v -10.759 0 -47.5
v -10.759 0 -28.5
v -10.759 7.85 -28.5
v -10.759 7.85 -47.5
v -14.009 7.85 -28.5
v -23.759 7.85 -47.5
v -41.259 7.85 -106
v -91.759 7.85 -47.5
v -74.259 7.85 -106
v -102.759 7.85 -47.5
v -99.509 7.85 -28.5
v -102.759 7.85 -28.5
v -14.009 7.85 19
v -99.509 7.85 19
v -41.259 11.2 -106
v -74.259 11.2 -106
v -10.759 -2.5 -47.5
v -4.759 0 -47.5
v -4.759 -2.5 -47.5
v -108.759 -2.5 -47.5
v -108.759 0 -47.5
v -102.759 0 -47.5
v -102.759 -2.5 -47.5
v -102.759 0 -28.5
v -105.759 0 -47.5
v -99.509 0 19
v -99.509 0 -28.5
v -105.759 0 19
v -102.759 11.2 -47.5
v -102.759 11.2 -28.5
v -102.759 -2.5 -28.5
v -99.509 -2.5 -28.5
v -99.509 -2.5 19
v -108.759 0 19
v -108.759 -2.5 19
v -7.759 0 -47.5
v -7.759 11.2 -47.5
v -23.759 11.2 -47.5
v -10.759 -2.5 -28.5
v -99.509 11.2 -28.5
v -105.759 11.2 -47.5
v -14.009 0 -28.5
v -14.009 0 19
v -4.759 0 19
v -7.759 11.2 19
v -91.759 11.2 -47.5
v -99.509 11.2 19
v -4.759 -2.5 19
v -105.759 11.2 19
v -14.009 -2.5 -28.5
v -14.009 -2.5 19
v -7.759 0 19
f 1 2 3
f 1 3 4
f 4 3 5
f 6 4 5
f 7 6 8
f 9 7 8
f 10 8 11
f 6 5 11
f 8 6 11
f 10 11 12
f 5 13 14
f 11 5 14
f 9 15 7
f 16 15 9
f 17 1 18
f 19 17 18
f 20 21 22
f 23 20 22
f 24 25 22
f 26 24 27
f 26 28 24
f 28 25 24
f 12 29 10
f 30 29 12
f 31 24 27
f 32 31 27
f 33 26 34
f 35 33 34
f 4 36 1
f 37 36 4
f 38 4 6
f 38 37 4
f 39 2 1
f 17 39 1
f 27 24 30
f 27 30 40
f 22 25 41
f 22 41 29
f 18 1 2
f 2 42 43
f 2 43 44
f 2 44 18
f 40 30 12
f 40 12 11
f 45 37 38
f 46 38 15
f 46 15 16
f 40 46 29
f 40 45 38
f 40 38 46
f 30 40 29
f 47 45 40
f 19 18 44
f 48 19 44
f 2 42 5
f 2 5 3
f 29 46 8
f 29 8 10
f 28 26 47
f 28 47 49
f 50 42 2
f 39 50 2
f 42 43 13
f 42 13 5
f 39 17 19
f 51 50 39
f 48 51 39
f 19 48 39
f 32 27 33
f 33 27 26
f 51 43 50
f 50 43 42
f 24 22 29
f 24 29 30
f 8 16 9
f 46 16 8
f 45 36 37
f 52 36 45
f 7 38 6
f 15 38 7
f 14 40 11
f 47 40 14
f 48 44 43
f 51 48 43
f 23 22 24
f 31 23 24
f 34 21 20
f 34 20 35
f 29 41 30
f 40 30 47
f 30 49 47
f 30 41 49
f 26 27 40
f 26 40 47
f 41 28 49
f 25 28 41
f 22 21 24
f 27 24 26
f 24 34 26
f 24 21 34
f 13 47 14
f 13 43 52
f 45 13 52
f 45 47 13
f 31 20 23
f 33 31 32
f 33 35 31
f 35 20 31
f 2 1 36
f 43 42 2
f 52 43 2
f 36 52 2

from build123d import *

# Parameters (mm, degrees)
F0_W     = 3
F0_H     = 66.5
F1_DEPTH = 2.5
F2_DEPTH = 11.2
F4_DEPTH = 3.35


with BuildPart() as f1:
    # F0 (on Front) → F1 (new body)
    with BuildSketch(Plane.XZ):
        with Locations((-107.2585358843, -14.25)):
            Rectangle(F0_W, F0_H)
        Polygon((-99.5085358843, 19), (-105.7585358843, 19), (-105.7585358843, -47.5), (-102.7585358843, -47.5), (-102.7585358843, -28.5), (-99.5085358843, -28.5), align=None)
    extrude(amount=F1_DEPTH)


with BuildPart() as f1b:
    # F0 (on Front) → F1, piece 2 (new body)
    with BuildSketch(Plane.XZ):
        with Locations((-6.2585358843, -14.25)):
            Rectangle(F0_W, F0_H)
        Polygon((-13.5085358843, 19), (-14.0085358843, 19), (-14.0085358843, -28.5), (-10.7585358843, -28.5), (-10.7585358843, -47.5), (-7.7585358843, -47.5), (-7.7585358843, 19), align=None)
    extrude(amount=F1_DEPTH)


with BuildPart() as f2:
    # F0 (on Front) → F2 (new body)
    with BuildSketch(Plane.XZ):
        Polygon((-99.5085358843, 19), (-105.7585358843, 19), (-105.7585358843, -47.5), (-102.7585358843, -47.5), (-102.7585358843, -28.5), (-99.5085358843, -28.5), align=None)
    extrude(amount=-F2_DEPTH)


with BuildPart() as f2b:
    # F0 (on Front) → F2, piece 2 (new body)
    with BuildSketch(Plane.XZ):
        Polygon((-13.5085358843, 19), (-14.0085358843, 19), (-14.0085358843, -28.5), (-10.7585358843, -28.5), (-10.7585358843, -47.5), (-7.7585358843, -47.5), (-7.7585358843, 19), align=None)
    extrude(amount=-F2_DEPTH)

    # F3 (on face) → F4 (join)
    with BuildSketch(Plane(origin=(0, 11.2, 0), x_dir=(-1, 0, 0), z_dir=(0, 1, 0))):
        Polygon((91.7585358843, -47.5), (102.7585358843, -47.5), (102.7585358843, -28.5), (99.5085358843, -28.5), (99.5085358843, 19), (57.7585358843, 19), (57.7585358843, -47.5), align=None)
        Polygon((74.2585358843, -106), (91.7585358843, -47.5), (57.7585358843, -47.5), (57.7585358843, -106), align=None)
        Polygon((57.7585358843, -106), (57.7585358843, -47.5), (23.7585358843, -47.5), (41.2585358843, -106), align=None)
        Polygon((23.7585358843, -47.5), (57.7585358843, -47.5), (57.7585358843, 19), (9.7585358843, 19), (9.7585358843, -47.5), align=None)
    extrude(amount=-F4_DEPTH)


solid = Compound([f1.part, f1b.part, f2.part, f2b.part])
